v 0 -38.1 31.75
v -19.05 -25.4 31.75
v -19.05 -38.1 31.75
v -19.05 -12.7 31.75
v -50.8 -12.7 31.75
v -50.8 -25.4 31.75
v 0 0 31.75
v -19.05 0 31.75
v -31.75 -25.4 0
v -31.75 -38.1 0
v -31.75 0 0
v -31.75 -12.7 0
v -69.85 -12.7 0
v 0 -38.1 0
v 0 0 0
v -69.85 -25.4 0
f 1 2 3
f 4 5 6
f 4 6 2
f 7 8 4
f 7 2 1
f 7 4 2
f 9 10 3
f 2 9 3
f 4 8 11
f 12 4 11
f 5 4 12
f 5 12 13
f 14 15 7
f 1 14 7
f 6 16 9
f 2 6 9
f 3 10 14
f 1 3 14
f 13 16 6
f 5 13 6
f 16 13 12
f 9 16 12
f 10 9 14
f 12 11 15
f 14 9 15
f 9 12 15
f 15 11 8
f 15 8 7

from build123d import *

# Parameters (mm, degrees)
F0_W     = 69.85
F0_H     = 31.75
F1_DEPTH = 38.1
F3_DEPTH = 12.7
F5_DEPTH = 12.7
F7_DEPTH = 25.401


# Not quite as in the source:
# - a feature names something its author has since deleted; it is built from what else it names


with BuildPart() as f1:
    # F0 (on Front) → F1 (new body)
    with BuildSketch(Plane.XZ):
        with Locations((-34.925, 15.875)):
            Rectangle(F0_W, F0_H)
    extrude(amount=F1_DEPTH)

    # F2 (on face) → F3 (cut)
    with BuildSketch(Plane(origin=(0, 0, 0), x_dir=(-1, 0, 0), z_dir=(0, 1, 0))):
        Polygon((69.85, 31.75), (19.05, 31.75), (31.75, 0), (69.85, 0), align=None)
    extrude(amount=-F3_DEPTH, mode=Mode.SUBTRACT)

    # F4 (on face) → F5 (cut)
    with BuildSketch(Plane.XZ.offset(38.1)):
        Polygon((-31.75, 0), (-19.05, 31.75), (-69.85, 31.75), (-69.85, 0), align=None)
    extrude(amount=-F5_DEPTH, mode=Mode.SUBTRACT)

    # F6 (on face) → F7 (cut, through all)
    with BuildSketch(Plane.XZ.offset(25.4)):
        Polygon((-69.85, 0), (-50.8, 31.75), (-69.85, 31.75), align=None)
    extrude(amount=-F7_DEPTH, mode=Mode.SUBTRACT)


solid = f1.part
